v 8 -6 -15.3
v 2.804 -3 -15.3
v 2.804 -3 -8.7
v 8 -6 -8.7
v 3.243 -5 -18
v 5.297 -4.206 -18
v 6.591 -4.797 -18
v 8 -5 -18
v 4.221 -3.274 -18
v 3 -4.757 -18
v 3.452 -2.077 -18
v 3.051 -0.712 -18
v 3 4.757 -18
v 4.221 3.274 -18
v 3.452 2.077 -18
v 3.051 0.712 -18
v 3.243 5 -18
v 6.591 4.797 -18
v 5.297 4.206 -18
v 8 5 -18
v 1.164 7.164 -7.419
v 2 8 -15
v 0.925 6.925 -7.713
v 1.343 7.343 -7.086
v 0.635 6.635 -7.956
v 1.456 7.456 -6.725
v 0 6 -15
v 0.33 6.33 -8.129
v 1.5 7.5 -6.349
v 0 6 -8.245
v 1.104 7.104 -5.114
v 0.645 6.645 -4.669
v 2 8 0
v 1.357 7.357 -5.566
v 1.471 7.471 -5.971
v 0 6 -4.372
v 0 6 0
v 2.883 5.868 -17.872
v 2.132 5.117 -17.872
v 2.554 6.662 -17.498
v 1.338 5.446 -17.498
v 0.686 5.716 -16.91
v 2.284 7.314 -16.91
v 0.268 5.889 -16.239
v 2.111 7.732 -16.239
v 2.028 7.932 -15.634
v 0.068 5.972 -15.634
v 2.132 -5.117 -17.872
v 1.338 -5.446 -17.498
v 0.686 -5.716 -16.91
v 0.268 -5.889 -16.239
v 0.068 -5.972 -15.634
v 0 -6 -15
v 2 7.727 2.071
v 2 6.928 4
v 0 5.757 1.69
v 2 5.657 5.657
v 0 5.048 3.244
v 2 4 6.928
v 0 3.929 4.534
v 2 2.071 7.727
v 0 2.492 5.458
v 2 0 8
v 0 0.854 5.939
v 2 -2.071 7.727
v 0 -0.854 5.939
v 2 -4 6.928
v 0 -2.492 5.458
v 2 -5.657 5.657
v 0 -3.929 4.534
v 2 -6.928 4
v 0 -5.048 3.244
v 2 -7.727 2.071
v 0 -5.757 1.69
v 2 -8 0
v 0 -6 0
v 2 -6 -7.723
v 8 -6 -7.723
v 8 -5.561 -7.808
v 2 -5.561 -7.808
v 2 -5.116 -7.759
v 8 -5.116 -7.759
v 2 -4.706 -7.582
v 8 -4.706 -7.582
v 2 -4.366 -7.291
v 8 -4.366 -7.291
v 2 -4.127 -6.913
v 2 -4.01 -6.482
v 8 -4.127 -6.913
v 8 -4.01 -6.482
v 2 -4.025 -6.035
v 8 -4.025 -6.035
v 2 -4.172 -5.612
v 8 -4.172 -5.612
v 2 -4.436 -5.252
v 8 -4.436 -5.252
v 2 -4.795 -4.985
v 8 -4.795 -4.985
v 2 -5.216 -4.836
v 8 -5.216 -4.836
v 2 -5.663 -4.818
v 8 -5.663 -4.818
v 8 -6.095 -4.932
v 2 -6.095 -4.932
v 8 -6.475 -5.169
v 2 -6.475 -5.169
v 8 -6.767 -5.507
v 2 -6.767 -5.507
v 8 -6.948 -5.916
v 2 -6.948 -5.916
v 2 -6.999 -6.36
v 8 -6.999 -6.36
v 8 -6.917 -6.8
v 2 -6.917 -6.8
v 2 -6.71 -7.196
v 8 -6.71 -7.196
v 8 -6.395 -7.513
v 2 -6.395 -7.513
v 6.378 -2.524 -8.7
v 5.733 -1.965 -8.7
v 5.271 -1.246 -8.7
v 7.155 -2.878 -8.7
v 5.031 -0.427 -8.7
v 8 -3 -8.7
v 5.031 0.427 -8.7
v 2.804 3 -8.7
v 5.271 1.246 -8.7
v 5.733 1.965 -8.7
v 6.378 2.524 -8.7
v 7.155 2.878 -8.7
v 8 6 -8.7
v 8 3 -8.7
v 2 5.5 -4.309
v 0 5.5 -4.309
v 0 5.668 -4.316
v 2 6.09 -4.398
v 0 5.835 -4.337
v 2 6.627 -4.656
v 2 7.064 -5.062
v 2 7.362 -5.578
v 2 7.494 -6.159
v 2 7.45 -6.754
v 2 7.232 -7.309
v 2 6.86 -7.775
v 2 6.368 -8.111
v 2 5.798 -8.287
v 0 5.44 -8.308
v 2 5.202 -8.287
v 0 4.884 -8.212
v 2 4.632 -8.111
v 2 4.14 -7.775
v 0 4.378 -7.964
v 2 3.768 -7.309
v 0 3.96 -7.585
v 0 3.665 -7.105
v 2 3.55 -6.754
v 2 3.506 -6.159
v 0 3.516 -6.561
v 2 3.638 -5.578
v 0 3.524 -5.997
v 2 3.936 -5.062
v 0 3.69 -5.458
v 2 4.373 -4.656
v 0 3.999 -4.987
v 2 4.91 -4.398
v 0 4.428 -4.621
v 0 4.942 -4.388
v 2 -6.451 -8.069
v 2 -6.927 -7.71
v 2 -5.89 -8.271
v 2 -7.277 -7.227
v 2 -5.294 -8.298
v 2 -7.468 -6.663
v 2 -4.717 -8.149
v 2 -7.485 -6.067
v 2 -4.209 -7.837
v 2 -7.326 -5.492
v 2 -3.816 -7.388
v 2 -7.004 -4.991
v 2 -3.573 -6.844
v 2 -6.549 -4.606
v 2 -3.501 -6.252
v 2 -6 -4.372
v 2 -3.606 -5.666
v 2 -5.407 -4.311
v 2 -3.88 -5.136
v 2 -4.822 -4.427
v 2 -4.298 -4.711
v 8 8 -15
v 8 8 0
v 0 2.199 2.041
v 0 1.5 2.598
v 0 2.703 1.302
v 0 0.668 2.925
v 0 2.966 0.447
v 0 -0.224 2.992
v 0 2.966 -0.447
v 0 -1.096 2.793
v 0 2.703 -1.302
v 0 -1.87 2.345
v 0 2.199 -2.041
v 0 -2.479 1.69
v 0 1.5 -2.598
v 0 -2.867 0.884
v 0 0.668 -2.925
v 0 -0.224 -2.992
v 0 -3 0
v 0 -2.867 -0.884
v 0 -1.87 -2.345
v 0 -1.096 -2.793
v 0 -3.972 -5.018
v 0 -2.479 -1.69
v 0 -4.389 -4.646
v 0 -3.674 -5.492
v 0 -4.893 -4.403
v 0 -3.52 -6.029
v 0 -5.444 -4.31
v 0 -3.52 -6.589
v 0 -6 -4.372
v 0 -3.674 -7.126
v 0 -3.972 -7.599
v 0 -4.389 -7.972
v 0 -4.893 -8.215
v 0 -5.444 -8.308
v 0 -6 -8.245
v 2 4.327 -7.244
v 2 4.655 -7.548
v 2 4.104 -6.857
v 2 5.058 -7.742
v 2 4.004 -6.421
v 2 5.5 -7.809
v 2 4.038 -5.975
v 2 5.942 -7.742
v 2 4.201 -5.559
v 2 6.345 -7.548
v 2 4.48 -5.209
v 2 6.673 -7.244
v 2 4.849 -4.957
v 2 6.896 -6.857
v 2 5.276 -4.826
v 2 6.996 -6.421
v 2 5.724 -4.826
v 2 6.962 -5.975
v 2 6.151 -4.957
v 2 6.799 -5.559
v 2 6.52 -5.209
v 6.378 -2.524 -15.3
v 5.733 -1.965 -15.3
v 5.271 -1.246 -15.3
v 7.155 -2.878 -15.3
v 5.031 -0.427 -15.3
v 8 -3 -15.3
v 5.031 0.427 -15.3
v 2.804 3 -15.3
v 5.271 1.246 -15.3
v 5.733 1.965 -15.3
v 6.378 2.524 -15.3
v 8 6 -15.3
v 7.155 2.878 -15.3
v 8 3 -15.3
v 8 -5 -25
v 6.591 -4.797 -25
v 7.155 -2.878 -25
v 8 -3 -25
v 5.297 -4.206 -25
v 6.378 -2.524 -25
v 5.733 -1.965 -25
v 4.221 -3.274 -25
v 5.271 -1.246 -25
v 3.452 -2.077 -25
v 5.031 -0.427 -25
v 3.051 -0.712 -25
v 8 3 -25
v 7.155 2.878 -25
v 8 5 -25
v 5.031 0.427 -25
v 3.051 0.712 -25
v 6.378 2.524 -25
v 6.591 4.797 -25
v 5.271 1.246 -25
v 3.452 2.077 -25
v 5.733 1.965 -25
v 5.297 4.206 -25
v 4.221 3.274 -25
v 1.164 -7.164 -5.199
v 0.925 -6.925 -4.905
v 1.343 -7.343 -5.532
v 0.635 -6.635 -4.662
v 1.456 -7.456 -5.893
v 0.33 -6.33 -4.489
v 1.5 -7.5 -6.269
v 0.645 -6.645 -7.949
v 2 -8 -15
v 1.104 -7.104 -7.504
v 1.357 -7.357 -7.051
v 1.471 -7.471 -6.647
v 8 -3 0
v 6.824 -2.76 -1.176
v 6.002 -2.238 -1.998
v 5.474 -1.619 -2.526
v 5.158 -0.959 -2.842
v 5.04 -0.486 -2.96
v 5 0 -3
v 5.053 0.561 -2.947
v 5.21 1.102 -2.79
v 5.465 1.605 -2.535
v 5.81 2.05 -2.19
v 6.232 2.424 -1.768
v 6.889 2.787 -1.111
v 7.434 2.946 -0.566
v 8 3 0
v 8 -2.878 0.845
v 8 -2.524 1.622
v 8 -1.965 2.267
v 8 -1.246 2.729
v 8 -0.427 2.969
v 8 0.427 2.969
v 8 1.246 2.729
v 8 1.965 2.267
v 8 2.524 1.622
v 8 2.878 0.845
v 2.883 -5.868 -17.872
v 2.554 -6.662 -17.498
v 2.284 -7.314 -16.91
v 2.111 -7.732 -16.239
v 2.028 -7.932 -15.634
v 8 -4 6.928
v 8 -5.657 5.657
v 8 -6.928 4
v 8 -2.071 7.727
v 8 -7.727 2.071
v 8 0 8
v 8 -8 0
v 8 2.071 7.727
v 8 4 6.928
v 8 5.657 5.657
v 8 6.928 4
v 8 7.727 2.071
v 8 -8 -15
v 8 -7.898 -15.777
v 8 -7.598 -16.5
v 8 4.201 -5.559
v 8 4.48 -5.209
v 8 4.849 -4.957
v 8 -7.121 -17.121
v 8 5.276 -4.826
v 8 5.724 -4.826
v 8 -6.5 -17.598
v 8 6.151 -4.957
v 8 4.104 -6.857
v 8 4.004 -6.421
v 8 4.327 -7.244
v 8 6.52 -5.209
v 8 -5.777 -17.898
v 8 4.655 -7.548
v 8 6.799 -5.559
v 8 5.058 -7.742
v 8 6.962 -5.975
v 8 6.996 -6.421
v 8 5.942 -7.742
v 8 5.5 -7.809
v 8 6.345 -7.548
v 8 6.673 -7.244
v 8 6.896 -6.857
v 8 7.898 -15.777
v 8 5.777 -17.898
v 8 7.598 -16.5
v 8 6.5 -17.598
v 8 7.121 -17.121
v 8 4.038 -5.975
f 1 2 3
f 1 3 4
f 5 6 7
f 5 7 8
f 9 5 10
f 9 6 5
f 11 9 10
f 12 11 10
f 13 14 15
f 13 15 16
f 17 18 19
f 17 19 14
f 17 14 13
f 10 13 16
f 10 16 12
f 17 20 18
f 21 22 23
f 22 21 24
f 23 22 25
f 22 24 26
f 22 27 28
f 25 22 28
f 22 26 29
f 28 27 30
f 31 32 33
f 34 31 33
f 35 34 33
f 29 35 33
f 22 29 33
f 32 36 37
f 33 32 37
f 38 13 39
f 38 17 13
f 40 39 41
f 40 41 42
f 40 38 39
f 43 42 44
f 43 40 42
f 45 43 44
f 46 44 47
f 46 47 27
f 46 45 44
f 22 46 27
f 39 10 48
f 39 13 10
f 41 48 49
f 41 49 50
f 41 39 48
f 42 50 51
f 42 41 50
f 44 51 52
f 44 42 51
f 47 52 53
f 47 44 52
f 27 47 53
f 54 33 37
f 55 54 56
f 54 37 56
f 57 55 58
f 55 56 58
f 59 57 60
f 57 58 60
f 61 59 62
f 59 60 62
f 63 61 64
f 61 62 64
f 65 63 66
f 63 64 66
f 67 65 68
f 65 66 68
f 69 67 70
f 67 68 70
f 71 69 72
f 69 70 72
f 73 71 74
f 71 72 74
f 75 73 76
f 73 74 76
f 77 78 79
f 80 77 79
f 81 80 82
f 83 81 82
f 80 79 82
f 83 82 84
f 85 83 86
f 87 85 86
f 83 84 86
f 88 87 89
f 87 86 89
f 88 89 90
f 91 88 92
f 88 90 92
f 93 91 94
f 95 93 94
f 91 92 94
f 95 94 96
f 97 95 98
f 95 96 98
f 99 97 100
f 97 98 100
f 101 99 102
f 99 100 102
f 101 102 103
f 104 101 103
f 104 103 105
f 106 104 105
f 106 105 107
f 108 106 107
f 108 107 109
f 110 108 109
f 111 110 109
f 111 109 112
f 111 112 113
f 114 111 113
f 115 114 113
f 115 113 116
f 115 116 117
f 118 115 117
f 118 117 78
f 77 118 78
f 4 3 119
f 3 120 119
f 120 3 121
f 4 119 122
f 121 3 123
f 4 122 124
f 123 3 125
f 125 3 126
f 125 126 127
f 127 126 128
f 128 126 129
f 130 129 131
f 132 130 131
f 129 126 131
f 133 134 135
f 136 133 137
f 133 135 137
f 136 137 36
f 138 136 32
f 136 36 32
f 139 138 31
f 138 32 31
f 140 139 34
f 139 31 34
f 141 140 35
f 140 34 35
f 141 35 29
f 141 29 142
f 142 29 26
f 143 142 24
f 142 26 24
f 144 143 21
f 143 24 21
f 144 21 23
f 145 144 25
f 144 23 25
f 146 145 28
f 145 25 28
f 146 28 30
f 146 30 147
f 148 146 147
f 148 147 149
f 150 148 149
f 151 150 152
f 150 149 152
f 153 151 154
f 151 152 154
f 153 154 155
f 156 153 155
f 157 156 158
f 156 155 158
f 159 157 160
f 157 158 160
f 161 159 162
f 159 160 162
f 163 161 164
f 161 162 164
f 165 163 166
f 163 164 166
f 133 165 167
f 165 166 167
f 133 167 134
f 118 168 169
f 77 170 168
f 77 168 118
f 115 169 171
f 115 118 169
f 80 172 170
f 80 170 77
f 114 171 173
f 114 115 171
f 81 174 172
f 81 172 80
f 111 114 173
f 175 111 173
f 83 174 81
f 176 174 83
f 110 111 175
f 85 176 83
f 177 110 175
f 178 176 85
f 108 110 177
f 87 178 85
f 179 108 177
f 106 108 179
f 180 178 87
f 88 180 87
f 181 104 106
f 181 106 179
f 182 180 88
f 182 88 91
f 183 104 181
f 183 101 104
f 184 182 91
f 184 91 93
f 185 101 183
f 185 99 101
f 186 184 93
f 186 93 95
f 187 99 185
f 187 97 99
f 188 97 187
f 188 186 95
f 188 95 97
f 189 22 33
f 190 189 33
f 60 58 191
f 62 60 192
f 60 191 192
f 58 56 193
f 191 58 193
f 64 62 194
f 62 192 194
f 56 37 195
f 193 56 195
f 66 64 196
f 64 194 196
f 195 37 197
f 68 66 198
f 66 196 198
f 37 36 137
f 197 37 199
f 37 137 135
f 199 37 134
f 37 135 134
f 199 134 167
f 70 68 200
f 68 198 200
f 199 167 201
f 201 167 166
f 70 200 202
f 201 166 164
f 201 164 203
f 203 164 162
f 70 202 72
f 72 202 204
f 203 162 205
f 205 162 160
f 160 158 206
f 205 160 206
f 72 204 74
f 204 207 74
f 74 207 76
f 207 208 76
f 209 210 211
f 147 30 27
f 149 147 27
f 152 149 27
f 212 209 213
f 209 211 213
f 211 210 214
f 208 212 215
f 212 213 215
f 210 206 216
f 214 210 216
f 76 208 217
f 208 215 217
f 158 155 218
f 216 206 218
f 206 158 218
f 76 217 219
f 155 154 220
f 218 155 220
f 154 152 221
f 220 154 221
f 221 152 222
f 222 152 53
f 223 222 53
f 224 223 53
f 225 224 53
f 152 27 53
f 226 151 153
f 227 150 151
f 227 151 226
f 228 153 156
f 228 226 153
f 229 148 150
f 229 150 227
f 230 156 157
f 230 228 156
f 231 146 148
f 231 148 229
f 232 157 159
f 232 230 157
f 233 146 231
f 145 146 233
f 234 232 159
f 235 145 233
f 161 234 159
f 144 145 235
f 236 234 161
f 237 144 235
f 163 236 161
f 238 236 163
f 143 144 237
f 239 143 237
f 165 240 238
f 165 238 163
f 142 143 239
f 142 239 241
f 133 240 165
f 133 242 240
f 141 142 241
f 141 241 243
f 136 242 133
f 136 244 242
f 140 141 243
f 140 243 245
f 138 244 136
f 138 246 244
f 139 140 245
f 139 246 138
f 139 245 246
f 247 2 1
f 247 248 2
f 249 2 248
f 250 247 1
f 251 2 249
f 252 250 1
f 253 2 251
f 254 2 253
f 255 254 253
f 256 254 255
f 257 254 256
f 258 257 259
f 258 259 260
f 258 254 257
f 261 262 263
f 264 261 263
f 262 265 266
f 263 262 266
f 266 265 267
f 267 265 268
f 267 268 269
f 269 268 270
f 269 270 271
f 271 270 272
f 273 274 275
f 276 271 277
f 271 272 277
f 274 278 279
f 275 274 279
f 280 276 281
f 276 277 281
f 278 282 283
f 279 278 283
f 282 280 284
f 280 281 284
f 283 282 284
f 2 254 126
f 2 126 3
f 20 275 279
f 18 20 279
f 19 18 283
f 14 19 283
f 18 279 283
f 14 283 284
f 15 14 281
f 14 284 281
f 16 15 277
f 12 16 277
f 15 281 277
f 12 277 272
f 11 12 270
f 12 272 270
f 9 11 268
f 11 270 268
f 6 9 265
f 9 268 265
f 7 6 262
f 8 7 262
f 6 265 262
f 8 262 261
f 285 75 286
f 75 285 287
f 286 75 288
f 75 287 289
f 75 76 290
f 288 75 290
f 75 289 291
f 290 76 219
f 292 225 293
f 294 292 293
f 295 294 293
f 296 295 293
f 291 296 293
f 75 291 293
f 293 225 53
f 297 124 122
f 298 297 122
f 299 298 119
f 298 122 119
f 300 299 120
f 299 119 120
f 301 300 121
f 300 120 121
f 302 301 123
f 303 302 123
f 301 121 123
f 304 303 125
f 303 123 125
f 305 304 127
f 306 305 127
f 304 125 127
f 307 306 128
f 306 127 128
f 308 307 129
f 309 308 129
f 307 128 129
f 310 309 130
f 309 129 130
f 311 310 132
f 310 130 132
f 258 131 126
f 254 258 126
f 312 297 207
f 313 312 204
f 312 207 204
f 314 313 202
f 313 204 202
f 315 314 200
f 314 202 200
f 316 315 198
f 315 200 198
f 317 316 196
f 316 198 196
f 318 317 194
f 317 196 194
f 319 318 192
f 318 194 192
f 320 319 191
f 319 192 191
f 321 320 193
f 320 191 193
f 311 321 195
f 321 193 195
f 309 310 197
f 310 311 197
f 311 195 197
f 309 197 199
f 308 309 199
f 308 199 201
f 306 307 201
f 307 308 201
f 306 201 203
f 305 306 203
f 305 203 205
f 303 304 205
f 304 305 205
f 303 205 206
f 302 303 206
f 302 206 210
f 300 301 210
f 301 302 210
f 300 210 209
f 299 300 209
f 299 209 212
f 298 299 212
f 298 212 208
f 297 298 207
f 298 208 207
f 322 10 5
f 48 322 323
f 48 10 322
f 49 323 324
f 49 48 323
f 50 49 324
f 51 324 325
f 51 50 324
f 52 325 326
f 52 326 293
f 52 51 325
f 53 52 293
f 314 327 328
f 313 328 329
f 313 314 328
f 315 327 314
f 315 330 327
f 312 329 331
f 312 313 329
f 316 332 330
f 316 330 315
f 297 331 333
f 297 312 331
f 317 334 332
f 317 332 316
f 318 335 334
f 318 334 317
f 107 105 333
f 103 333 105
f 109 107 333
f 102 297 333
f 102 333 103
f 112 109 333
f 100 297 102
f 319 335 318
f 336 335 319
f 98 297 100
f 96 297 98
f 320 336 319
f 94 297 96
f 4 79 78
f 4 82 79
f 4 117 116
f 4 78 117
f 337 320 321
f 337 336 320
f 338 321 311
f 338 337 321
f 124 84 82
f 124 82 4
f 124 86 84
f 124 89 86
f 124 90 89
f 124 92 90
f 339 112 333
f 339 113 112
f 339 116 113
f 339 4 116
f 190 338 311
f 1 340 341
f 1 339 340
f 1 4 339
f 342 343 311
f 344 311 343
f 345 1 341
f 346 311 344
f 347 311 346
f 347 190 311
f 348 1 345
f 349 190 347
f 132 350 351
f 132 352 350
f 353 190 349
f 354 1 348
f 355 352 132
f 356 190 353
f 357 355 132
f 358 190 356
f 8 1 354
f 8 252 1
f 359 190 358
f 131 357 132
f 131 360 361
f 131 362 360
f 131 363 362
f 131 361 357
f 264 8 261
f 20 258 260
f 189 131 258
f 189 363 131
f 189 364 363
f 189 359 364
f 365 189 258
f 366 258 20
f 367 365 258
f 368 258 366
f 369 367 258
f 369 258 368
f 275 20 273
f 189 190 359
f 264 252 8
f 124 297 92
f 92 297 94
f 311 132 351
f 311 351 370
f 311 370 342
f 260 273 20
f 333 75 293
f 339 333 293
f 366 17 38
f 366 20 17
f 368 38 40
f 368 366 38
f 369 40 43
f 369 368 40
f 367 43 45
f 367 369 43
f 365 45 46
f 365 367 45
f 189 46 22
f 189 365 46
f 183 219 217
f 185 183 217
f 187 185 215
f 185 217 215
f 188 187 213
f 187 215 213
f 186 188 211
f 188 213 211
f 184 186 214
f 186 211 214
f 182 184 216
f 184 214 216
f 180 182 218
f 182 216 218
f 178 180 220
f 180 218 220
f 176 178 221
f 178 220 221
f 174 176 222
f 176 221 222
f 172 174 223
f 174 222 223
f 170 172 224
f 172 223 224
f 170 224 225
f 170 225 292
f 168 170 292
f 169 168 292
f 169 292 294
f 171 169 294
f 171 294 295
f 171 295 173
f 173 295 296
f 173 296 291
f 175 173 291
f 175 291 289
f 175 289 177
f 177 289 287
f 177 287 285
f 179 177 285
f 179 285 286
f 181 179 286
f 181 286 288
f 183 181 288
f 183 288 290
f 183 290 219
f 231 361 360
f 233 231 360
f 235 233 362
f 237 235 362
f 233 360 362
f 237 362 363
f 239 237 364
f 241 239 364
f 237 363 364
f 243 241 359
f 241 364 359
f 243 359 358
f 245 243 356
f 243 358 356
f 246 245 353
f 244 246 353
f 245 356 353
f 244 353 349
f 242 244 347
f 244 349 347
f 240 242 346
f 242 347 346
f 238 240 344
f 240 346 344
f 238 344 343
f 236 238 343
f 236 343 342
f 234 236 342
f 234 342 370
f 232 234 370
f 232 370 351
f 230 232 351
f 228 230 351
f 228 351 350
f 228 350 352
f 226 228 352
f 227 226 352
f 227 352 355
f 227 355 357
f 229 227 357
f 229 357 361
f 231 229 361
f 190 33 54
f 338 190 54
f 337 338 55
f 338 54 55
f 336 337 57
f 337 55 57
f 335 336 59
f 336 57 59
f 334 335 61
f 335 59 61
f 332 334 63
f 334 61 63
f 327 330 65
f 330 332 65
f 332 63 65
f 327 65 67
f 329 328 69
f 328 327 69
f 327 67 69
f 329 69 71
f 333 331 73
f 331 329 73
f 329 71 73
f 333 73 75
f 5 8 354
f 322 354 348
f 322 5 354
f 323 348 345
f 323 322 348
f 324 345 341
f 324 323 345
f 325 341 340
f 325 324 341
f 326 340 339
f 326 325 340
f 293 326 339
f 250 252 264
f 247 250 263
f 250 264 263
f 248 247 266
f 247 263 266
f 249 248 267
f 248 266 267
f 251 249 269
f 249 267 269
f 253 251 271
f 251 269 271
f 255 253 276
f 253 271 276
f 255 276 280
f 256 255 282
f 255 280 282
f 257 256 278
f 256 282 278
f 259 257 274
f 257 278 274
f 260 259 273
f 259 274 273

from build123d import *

# Parameters (mm, degrees)
BOSS_EXTRUDE1_DEPTH          = 16
CHAMFER2_SIZE                = 2
ENL_V_MAT_EXTRU_1_REACH      = 39.537
ENL_V_MAT_EXTRU_1_END_RADIUS = 3
ESQUISSE1_R                  = 3
ESQUISSE2_W                  = 9.751627811
ESQUISSE2_H                  = 34.282380126
ENL_V_MAT_EXTRU_2_DEPTH      = 56
ENL_V_MAT_EXTRU_3_DEPTH      = 3.3
ENL_V_MAT_EXTRU_3_DEPTH_BACK = 3.3
ESQUISSE8_R                  = 1.5
ENL_V_MAT_EXTRU_4_DEPTH      = 10.3
ESQUISSE9_R                  = 2
ENL_V_MAT_EXTRU_5_DEPTH      = 2
ENL_V_MAT_EXTRU_6_DEPTH      = 7
CONG_1_R                     = 3


with BuildPart() as part:
    # Sketch1 → Boss-Extrude1 (new body)
    with BuildSketch(Plane(origin=(0, 0, 0), x_dir=(0, -1, 0), z_dir=(1, 0, 0))):
        with BuildLine():
            ThreePointArc((-8, 0), (0, 8), (8, 0))
            Line((8, 0), (8, 25))
            Line((8, 25), (-8, 25))
            Line((-8, 25), (-8, 0))
        make_face()
        with BuildLine():
            ThreePointArc((-3, 0), (0, 3), (3, 0))
            Line((3, 0), (8, 0))
            ThreePointArc((8, 0), (0, 8), (-8, 0))
            Line((-8, 0), (-3, 0))
        make_face()
        with BuildLine():
            Line((8, 0), (3, 0))
            ThreePointArc((3, 0), (0, -3), (-3, 0))
            Line((-3, 0), (-8, 0))
            ThreePointArc((-8, 0), (0, -8), (8, 0))
        make_face()
    extrude(amount=BOSS_EXTRUDE1_DEPTH)

    # Chamfer2
    chamfer2_edges = [part.edges().sort_by_distance(p)[0] for p in [
        (16, 8, -12.5),
        (16, 0, 8),
        (0, 8, -12.5),
        (0, -8, -12.5),
        (0, 0, 8),
        (16, -8, -12.5),
    ]]
    chamfer(chamfer2_edges, length=CHAMFER2_SIZE)

    # Enlèv. mat.-Extru.1: up to this cylinder (the profile starts outside it)
    enl_v_mat_extru_1_end = Plane(origin=(8, 0, 0), z_dir=(-1, 0, 0)) * Cylinder(ENL_V_MAT_EXTRU_1_END_RADIUS, 86.074, mode=Mode.PRIVATE)
    # Esquisse1 → Enlèv. mat.-Extru.1 (cut, up to the surface)
    with BuildSketch(Plane(origin=(0, 0, -25), x_dir=(-1, 0, 0), z_dir=(0, 0, -1)), mode=Mode.PRIVATE) as enl_v_mat_extru_1_sk1:
        with Locations((-8, 0)):
            Circle(ESQUISSE1_R)
    enl_v_mat_extru_1_tool1 = extrude(enl_v_mat_extru_1_sk1.sketch, amount=-ENL_V_MAT_EXTRU_1_REACH, mode=Mode.PRIVATE) - enl_v_mat_extru_1_end
    add(enl_v_mat_extru_1_tool1.solids().sort_by_distance((8, 0, -25))[0], mode=Mode.SUBTRACT)

    # Esquisse2 → Enlèv. mat.-Extru.2 (cut)
    with BuildSketch(Plane(origin=(0, 8, 0), x_dir=(1, 0, 0), z_dir=(0, 1, 0))):
        with Locations((12.875813906, 7.858809937)):
            Rectangle(ESQUISSE2_W, ESQUISSE2_H)
    extrude(amount=-ENL_V_MAT_EXTRU_2_DEPTH, mode=Mode.SUBTRACT)

    # Esquisse4 → Enlèv. mat.-Extru.3 (cut, two sides: drawn at the far end of the back side and taken through both)
    with BuildSketch(Plane.XY.offset(-12).offset(-ENL_V_MAT_EXTRU_3_DEPTH_BACK)):
        Polygon((13.196152423, -3), (13.196152423, 3), (8, 6), (2.803847577, 3), (2.803847577, -3), (8, -6), align=None)
    extrude(amount=ENL_V_MAT_EXTRU_3_DEPTH + ENL_V_MAT_EXTRU_3_DEPTH_BACK, mode=Mode.SUBTRACT)

    # Esquisse8 → Enlèv. mat.-Extru.4 (cut)
    with BuildSketch(Plane(origin=(8, 0, 0), x_dir=(0, 0, -1), z_dir=(1, 0, 0))):
        with Locations((6.308944807, 5.5)):
            Circle(ESQUISSE8_R)
        with Locations(Location((6.308944807, -5.5, 0), (0, 0, 340.528779366))):
            Circle(ESQUISSE8_R)
    extrude(amount=-ENL_V_MAT_EXTRU_4_DEPTH, mode=Mode.SUBTRACT)

    # Esquisse9 → Enlèv. mat.-Extru.5 (cut)
    with BuildSketch(Plane.ZY):
        with Locations((-6.308944807, 5.5)):
            Circle(ESQUISSE9_R)
        with Locations(Location((-6.308944807, -5.5, 0), (0, 0, 345.522487814))):
            Circle(ESQUISSE9_R)
    extrude(amount=-ENL_V_MAT_EXTRU_5_DEPTH, mode=Mode.SUBTRACT)

    # Esquisse10 → Enlèv. mat.-Extru.6 (cut)
    with BuildSketch(Plane(origin=(0, 0, -25), x_dir=(-1, 0, 0), z_dir=(0, 0, -1))):
        with BuildLine():
            Line((-8, 8), (-8, 5))
            ThreePointArc((-8, 5), (-3, 0), (-8, -5))
            Line((-8, -5), (-8, -5.041535343))
            Line((-8, -5.041535343), (-8, -8))
            Line((-8, -8), (-2, -8))
            Line((-2, -8), (0, -6))
            Line((0, -6), (0, 6))
            Line((0, 6), (-2, 8))
            Line((-2, 8), (-8, 8))
        make_face()
    extrude(amount=-ENL_V_MAT_EXTRU_6_DEPTH, mode=Mode.SUBTRACT)

    # Congé1
    cong_1_edges = [part.edges().sort_by_distance(p)[0] for p in [
        (5, -8, -18),
        (1, -7, -18),
        (0, 0, -18),
        (1, 7, -18),
        (5, 8, -18),
    ]]
    fillet(cong_1_edges, radius=CONG_1_R - 0.0001)  # a hair under: the kernel refuses the full size


solid = part.part
